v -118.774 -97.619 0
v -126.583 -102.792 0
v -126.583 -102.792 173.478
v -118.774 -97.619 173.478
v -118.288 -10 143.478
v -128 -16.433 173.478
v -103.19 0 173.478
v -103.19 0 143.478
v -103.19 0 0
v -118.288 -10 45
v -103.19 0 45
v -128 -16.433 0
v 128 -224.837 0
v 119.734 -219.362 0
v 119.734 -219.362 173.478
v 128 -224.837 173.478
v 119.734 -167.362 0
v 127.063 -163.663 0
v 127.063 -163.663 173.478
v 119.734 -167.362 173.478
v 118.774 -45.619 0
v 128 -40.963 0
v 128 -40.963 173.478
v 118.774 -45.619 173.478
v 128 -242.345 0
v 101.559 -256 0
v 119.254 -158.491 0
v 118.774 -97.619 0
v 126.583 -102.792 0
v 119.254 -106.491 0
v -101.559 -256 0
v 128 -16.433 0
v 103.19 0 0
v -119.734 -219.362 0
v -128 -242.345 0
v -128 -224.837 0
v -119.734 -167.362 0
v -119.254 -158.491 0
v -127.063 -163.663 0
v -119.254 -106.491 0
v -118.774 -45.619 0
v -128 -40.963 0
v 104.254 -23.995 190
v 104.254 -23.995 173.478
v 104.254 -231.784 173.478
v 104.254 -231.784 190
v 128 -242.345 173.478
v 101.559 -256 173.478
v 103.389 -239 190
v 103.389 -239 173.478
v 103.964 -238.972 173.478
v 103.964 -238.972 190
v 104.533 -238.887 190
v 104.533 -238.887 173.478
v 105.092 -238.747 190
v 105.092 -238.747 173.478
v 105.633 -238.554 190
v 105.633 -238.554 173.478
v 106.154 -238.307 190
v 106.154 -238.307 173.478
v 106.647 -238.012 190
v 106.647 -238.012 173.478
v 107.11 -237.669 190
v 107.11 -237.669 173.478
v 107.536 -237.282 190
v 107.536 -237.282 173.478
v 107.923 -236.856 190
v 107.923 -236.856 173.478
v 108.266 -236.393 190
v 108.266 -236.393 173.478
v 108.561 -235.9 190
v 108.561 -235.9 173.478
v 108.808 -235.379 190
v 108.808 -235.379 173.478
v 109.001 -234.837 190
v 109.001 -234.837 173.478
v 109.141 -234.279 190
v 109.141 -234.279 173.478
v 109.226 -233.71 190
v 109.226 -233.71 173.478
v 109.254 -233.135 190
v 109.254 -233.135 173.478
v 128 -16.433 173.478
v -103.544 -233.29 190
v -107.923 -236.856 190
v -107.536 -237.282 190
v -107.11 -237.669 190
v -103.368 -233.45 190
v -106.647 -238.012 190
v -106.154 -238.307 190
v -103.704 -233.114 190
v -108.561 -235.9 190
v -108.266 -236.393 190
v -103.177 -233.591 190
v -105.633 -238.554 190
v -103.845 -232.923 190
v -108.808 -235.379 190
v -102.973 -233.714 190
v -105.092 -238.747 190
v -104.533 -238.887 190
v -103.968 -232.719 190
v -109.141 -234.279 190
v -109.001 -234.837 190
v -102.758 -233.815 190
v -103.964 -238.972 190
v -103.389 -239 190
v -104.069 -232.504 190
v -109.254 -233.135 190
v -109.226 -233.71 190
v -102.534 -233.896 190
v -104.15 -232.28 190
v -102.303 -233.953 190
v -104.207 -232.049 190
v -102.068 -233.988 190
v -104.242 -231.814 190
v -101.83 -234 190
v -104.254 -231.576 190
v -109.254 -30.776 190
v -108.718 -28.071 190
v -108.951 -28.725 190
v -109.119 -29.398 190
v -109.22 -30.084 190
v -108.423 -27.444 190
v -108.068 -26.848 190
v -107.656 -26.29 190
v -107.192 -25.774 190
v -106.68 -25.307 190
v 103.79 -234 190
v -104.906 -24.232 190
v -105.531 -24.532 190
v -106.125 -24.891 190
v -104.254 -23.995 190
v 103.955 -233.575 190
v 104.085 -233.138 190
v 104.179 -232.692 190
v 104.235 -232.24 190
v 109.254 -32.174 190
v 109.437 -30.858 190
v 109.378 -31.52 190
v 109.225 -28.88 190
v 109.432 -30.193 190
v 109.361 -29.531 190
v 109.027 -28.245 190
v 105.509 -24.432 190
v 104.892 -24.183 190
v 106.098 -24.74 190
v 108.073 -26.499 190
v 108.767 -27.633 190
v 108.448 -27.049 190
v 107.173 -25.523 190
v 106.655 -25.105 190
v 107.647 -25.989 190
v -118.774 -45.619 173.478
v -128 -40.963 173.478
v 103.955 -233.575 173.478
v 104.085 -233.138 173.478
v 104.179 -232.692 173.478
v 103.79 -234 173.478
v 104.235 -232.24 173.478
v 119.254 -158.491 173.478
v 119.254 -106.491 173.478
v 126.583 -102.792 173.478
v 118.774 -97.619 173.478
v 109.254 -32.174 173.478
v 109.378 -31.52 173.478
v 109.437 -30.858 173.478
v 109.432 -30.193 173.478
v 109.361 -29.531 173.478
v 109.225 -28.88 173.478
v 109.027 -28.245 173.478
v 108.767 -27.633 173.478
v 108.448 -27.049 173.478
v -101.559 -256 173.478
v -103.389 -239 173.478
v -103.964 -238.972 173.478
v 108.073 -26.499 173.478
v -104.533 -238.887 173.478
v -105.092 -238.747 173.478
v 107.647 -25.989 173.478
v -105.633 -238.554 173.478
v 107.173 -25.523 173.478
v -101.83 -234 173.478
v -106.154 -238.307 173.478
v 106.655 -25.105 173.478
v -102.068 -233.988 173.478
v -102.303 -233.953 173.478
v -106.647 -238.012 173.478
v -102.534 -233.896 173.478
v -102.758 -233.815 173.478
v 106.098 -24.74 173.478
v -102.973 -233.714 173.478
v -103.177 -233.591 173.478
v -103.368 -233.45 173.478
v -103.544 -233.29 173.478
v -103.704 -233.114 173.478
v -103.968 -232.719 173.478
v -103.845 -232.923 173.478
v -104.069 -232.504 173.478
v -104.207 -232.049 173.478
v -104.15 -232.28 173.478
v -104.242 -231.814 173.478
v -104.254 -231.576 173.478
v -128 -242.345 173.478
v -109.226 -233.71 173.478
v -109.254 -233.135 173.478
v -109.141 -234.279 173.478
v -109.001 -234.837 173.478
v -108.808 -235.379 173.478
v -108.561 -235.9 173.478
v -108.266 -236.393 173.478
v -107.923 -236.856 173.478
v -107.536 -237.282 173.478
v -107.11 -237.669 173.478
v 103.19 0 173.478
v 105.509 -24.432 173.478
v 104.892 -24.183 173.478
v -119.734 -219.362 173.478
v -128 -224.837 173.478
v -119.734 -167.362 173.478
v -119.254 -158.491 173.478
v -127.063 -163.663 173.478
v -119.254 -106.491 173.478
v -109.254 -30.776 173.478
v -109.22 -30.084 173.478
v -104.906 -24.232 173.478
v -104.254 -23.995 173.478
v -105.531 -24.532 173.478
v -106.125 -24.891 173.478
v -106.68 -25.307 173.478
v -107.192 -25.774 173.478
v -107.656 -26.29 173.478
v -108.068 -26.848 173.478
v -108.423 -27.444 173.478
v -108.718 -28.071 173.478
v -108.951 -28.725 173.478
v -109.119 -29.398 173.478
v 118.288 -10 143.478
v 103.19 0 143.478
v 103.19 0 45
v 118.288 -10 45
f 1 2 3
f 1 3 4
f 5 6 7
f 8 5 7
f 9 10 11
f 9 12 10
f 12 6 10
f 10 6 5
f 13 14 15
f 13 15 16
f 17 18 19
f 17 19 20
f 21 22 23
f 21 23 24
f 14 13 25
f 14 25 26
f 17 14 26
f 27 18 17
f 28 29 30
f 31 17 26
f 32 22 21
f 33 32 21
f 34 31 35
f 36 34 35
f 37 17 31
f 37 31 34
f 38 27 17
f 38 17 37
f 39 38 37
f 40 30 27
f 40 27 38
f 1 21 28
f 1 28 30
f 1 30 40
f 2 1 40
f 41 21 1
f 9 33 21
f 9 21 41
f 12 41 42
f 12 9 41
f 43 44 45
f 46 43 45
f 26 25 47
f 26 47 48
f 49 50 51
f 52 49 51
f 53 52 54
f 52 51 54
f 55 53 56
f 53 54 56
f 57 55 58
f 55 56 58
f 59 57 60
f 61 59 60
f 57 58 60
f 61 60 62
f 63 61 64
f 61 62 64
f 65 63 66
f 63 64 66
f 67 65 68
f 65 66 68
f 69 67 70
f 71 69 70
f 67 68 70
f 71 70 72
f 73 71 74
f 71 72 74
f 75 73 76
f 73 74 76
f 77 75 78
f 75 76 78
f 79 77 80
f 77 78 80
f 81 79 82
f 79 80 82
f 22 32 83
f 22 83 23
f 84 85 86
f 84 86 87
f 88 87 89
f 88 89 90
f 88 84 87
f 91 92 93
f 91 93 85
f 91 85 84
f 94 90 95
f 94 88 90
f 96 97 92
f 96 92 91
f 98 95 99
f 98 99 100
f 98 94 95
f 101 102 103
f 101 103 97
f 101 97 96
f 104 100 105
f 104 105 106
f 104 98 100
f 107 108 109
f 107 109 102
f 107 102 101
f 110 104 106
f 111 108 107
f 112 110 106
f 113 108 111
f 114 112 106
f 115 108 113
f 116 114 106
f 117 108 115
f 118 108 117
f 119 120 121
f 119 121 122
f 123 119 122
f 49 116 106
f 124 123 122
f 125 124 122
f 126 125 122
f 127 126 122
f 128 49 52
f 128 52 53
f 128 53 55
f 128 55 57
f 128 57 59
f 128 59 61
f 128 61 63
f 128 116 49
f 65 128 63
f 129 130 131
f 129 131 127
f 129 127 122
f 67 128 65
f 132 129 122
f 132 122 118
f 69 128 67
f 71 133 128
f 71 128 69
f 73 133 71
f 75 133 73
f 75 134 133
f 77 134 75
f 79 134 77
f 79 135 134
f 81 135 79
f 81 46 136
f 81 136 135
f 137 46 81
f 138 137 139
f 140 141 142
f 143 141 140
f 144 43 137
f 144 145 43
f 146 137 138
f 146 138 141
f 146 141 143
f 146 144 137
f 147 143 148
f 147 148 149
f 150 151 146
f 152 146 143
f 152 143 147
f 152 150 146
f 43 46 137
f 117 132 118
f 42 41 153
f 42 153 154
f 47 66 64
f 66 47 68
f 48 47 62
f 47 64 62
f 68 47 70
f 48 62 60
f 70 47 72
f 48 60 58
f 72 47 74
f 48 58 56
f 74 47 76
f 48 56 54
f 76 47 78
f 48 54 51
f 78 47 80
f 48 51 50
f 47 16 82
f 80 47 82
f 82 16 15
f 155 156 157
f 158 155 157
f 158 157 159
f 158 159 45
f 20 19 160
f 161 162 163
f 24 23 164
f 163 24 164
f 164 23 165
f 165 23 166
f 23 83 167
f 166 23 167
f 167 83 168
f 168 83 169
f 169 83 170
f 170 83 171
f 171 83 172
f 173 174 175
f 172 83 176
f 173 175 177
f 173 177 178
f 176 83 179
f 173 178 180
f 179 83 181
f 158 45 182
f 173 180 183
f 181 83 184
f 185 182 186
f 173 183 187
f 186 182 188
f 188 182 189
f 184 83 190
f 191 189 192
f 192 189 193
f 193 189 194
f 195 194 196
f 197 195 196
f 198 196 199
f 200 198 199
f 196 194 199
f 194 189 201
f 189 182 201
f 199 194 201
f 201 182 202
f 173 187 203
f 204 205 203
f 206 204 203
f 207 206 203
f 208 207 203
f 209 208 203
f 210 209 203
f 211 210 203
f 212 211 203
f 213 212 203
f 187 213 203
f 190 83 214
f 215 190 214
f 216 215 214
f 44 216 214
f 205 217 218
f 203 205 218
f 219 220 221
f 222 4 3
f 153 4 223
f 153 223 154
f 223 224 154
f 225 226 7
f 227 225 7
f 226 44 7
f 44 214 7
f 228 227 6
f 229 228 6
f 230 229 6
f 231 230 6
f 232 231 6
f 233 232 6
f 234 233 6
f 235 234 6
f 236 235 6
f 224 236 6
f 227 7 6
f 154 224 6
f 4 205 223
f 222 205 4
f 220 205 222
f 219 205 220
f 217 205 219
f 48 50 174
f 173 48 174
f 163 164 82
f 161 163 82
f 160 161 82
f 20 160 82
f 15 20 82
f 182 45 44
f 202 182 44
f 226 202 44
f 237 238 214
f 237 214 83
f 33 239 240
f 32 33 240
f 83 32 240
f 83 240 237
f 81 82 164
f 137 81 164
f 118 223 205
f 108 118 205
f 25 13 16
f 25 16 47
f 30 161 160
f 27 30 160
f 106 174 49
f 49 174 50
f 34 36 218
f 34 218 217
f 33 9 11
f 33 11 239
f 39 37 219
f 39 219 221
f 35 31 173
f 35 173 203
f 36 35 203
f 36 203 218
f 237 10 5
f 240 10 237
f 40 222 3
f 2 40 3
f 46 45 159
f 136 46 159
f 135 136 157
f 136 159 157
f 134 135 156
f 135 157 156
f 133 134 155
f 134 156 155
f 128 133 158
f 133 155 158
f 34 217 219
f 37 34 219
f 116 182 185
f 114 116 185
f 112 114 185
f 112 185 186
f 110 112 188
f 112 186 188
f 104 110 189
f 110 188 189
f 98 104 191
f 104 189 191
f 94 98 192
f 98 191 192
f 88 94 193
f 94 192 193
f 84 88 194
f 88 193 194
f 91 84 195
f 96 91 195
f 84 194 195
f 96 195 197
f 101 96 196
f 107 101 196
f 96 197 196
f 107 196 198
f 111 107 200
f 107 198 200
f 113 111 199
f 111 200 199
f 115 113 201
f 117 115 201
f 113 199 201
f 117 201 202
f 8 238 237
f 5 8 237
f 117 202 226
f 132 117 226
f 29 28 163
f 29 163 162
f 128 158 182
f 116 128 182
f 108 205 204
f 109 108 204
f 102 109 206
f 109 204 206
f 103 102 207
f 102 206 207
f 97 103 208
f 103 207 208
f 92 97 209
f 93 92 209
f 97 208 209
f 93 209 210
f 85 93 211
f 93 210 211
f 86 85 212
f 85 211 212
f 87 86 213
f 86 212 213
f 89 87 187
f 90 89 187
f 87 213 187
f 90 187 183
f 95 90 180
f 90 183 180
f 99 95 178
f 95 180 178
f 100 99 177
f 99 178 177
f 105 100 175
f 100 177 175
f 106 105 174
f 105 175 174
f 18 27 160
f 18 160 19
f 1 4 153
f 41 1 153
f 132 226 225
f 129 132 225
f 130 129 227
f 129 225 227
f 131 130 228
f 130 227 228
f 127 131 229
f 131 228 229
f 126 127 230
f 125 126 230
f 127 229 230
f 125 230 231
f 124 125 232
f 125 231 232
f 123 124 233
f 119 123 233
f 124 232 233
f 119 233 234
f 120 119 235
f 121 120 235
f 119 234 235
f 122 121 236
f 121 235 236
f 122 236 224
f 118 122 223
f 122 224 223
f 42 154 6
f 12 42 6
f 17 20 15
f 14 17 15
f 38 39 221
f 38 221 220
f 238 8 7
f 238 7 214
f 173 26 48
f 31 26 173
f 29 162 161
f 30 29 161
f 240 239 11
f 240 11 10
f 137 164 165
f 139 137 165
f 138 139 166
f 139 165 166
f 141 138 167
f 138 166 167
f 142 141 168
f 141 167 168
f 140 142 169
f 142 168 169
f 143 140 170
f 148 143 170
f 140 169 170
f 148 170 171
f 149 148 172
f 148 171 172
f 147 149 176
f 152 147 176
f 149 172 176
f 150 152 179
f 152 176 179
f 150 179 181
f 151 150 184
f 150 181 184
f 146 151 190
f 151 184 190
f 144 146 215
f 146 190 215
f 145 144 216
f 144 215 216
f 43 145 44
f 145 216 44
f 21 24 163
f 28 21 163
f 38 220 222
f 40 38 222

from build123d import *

# Parameters (mm, degrees)
BOSS_EXTRUDE1_DEPTH = 173.478
BOSS_EXTRUDE2_DEPTH = 16.522
SKETCH5_W           = 256
SKETCH5_H           = 98.478
CUT_EXTRUDE3_DEPTH  = 10


with BuildPart() as part:
    # Sketch1 → Boss-Extrude1 (new body)
    with BuildSketch(Plane.XY):
        Polygon((-103.1895488, 0), (103.1895488, 0), (128, -16.432610434), (128, -40.962966098), (118.774155672, -45.61934731), (118.774155672, -97.61934731), (126.583328469, -102.791566604), (119.25400561, -106.490753372), (119.25400561, -158.490753372), (127.063178407, -163.662972666), (119.733855548, -167.362159434), (119.733855548, -219.362159434), (128, -224.837043001), (128, -242.345271931), (101.558790198, -256), (-101.558790198, -256), (-128, -242.345271931), (-128, -224.837043001), (-119.733855548, -219.362159434), (-119.733855548, -167.362159434), (-127.063178407, -163.662972666), (-119.25400561, -158.490753372), (-119.25400561, -106.490753372), (-126.583328469, -102.791566604), (-118.774155672, -97.61934731), (-118.774155672, -45.61934731), (-128, -40.962966098), (-128, -16.432610434), align=None)
    extrude(amount=BOSS_EXTRUDE1_DEPTH)

    # Sketch3 → Boss-Extrude2 (add)
    with BuildSketch(Plane.XY.offset(173.478)):
        with BuildLine():
            Line((-109.25400561, -30.77642723), (-109.25400561, -233.134965715))
            ThreePointArc((-109.25400561, -233.134965715), (-107.53617684, -237.28217123), (-103.388971325, -239))
            Line((-103.388971325, -239), (103.388971325, -239))
            ThreePointArc((103.388971325, -239), (107.53617684, -237.28217123), (109.25400561, -233.134965715))
            Line((109.25400561, -233.134965715), (109.25400561, -32.174007784))
            ThreePointArc((109.25400561, -32.174007784), (108.447882002, -27.049094521), (104.25400561, -23.99524907))
            Line((104.25400561, -23.99524907), (104.25400561, -231.784495248))
            ThreePointArc((104.25400561, -231.784495248), (104.136715259, -232.916299233), (103.789829206, -234))
            Line((103.789829206, -234), (-101.829987525, -234))
            ThreePointArc((-101.829987525, -234), (-103.544027151, -233.290021541), (-104.25400561, -231.575981915))
            Line((-104.25400561, -231.575981915), (-104.25400561, -23.99524907))
            ThreePointArc((-104.25400561, -23.99524907), (-107.868861491, -26.563815889), (-109.25400561, -30.77642723))
        make_face()
    extrude(amount=BOSS_EXTRUDE2_DEPTH)

    # Sketch5 → Cut-Extrude3 (cut)
    with BuildSketch(Plane(origin=(0, 0, 0), x_dir=(1, 0, 0), z_dir=(0, 1, 0))):
        with Locations((0, -94.239)):
            Rectangle(SKETCH5_W, SKETCH5_H)
    extrude(amount=-CUT_EXTRUDE3_DEPTH, mode=Mode.SUBTRACT)


solid = part.part
